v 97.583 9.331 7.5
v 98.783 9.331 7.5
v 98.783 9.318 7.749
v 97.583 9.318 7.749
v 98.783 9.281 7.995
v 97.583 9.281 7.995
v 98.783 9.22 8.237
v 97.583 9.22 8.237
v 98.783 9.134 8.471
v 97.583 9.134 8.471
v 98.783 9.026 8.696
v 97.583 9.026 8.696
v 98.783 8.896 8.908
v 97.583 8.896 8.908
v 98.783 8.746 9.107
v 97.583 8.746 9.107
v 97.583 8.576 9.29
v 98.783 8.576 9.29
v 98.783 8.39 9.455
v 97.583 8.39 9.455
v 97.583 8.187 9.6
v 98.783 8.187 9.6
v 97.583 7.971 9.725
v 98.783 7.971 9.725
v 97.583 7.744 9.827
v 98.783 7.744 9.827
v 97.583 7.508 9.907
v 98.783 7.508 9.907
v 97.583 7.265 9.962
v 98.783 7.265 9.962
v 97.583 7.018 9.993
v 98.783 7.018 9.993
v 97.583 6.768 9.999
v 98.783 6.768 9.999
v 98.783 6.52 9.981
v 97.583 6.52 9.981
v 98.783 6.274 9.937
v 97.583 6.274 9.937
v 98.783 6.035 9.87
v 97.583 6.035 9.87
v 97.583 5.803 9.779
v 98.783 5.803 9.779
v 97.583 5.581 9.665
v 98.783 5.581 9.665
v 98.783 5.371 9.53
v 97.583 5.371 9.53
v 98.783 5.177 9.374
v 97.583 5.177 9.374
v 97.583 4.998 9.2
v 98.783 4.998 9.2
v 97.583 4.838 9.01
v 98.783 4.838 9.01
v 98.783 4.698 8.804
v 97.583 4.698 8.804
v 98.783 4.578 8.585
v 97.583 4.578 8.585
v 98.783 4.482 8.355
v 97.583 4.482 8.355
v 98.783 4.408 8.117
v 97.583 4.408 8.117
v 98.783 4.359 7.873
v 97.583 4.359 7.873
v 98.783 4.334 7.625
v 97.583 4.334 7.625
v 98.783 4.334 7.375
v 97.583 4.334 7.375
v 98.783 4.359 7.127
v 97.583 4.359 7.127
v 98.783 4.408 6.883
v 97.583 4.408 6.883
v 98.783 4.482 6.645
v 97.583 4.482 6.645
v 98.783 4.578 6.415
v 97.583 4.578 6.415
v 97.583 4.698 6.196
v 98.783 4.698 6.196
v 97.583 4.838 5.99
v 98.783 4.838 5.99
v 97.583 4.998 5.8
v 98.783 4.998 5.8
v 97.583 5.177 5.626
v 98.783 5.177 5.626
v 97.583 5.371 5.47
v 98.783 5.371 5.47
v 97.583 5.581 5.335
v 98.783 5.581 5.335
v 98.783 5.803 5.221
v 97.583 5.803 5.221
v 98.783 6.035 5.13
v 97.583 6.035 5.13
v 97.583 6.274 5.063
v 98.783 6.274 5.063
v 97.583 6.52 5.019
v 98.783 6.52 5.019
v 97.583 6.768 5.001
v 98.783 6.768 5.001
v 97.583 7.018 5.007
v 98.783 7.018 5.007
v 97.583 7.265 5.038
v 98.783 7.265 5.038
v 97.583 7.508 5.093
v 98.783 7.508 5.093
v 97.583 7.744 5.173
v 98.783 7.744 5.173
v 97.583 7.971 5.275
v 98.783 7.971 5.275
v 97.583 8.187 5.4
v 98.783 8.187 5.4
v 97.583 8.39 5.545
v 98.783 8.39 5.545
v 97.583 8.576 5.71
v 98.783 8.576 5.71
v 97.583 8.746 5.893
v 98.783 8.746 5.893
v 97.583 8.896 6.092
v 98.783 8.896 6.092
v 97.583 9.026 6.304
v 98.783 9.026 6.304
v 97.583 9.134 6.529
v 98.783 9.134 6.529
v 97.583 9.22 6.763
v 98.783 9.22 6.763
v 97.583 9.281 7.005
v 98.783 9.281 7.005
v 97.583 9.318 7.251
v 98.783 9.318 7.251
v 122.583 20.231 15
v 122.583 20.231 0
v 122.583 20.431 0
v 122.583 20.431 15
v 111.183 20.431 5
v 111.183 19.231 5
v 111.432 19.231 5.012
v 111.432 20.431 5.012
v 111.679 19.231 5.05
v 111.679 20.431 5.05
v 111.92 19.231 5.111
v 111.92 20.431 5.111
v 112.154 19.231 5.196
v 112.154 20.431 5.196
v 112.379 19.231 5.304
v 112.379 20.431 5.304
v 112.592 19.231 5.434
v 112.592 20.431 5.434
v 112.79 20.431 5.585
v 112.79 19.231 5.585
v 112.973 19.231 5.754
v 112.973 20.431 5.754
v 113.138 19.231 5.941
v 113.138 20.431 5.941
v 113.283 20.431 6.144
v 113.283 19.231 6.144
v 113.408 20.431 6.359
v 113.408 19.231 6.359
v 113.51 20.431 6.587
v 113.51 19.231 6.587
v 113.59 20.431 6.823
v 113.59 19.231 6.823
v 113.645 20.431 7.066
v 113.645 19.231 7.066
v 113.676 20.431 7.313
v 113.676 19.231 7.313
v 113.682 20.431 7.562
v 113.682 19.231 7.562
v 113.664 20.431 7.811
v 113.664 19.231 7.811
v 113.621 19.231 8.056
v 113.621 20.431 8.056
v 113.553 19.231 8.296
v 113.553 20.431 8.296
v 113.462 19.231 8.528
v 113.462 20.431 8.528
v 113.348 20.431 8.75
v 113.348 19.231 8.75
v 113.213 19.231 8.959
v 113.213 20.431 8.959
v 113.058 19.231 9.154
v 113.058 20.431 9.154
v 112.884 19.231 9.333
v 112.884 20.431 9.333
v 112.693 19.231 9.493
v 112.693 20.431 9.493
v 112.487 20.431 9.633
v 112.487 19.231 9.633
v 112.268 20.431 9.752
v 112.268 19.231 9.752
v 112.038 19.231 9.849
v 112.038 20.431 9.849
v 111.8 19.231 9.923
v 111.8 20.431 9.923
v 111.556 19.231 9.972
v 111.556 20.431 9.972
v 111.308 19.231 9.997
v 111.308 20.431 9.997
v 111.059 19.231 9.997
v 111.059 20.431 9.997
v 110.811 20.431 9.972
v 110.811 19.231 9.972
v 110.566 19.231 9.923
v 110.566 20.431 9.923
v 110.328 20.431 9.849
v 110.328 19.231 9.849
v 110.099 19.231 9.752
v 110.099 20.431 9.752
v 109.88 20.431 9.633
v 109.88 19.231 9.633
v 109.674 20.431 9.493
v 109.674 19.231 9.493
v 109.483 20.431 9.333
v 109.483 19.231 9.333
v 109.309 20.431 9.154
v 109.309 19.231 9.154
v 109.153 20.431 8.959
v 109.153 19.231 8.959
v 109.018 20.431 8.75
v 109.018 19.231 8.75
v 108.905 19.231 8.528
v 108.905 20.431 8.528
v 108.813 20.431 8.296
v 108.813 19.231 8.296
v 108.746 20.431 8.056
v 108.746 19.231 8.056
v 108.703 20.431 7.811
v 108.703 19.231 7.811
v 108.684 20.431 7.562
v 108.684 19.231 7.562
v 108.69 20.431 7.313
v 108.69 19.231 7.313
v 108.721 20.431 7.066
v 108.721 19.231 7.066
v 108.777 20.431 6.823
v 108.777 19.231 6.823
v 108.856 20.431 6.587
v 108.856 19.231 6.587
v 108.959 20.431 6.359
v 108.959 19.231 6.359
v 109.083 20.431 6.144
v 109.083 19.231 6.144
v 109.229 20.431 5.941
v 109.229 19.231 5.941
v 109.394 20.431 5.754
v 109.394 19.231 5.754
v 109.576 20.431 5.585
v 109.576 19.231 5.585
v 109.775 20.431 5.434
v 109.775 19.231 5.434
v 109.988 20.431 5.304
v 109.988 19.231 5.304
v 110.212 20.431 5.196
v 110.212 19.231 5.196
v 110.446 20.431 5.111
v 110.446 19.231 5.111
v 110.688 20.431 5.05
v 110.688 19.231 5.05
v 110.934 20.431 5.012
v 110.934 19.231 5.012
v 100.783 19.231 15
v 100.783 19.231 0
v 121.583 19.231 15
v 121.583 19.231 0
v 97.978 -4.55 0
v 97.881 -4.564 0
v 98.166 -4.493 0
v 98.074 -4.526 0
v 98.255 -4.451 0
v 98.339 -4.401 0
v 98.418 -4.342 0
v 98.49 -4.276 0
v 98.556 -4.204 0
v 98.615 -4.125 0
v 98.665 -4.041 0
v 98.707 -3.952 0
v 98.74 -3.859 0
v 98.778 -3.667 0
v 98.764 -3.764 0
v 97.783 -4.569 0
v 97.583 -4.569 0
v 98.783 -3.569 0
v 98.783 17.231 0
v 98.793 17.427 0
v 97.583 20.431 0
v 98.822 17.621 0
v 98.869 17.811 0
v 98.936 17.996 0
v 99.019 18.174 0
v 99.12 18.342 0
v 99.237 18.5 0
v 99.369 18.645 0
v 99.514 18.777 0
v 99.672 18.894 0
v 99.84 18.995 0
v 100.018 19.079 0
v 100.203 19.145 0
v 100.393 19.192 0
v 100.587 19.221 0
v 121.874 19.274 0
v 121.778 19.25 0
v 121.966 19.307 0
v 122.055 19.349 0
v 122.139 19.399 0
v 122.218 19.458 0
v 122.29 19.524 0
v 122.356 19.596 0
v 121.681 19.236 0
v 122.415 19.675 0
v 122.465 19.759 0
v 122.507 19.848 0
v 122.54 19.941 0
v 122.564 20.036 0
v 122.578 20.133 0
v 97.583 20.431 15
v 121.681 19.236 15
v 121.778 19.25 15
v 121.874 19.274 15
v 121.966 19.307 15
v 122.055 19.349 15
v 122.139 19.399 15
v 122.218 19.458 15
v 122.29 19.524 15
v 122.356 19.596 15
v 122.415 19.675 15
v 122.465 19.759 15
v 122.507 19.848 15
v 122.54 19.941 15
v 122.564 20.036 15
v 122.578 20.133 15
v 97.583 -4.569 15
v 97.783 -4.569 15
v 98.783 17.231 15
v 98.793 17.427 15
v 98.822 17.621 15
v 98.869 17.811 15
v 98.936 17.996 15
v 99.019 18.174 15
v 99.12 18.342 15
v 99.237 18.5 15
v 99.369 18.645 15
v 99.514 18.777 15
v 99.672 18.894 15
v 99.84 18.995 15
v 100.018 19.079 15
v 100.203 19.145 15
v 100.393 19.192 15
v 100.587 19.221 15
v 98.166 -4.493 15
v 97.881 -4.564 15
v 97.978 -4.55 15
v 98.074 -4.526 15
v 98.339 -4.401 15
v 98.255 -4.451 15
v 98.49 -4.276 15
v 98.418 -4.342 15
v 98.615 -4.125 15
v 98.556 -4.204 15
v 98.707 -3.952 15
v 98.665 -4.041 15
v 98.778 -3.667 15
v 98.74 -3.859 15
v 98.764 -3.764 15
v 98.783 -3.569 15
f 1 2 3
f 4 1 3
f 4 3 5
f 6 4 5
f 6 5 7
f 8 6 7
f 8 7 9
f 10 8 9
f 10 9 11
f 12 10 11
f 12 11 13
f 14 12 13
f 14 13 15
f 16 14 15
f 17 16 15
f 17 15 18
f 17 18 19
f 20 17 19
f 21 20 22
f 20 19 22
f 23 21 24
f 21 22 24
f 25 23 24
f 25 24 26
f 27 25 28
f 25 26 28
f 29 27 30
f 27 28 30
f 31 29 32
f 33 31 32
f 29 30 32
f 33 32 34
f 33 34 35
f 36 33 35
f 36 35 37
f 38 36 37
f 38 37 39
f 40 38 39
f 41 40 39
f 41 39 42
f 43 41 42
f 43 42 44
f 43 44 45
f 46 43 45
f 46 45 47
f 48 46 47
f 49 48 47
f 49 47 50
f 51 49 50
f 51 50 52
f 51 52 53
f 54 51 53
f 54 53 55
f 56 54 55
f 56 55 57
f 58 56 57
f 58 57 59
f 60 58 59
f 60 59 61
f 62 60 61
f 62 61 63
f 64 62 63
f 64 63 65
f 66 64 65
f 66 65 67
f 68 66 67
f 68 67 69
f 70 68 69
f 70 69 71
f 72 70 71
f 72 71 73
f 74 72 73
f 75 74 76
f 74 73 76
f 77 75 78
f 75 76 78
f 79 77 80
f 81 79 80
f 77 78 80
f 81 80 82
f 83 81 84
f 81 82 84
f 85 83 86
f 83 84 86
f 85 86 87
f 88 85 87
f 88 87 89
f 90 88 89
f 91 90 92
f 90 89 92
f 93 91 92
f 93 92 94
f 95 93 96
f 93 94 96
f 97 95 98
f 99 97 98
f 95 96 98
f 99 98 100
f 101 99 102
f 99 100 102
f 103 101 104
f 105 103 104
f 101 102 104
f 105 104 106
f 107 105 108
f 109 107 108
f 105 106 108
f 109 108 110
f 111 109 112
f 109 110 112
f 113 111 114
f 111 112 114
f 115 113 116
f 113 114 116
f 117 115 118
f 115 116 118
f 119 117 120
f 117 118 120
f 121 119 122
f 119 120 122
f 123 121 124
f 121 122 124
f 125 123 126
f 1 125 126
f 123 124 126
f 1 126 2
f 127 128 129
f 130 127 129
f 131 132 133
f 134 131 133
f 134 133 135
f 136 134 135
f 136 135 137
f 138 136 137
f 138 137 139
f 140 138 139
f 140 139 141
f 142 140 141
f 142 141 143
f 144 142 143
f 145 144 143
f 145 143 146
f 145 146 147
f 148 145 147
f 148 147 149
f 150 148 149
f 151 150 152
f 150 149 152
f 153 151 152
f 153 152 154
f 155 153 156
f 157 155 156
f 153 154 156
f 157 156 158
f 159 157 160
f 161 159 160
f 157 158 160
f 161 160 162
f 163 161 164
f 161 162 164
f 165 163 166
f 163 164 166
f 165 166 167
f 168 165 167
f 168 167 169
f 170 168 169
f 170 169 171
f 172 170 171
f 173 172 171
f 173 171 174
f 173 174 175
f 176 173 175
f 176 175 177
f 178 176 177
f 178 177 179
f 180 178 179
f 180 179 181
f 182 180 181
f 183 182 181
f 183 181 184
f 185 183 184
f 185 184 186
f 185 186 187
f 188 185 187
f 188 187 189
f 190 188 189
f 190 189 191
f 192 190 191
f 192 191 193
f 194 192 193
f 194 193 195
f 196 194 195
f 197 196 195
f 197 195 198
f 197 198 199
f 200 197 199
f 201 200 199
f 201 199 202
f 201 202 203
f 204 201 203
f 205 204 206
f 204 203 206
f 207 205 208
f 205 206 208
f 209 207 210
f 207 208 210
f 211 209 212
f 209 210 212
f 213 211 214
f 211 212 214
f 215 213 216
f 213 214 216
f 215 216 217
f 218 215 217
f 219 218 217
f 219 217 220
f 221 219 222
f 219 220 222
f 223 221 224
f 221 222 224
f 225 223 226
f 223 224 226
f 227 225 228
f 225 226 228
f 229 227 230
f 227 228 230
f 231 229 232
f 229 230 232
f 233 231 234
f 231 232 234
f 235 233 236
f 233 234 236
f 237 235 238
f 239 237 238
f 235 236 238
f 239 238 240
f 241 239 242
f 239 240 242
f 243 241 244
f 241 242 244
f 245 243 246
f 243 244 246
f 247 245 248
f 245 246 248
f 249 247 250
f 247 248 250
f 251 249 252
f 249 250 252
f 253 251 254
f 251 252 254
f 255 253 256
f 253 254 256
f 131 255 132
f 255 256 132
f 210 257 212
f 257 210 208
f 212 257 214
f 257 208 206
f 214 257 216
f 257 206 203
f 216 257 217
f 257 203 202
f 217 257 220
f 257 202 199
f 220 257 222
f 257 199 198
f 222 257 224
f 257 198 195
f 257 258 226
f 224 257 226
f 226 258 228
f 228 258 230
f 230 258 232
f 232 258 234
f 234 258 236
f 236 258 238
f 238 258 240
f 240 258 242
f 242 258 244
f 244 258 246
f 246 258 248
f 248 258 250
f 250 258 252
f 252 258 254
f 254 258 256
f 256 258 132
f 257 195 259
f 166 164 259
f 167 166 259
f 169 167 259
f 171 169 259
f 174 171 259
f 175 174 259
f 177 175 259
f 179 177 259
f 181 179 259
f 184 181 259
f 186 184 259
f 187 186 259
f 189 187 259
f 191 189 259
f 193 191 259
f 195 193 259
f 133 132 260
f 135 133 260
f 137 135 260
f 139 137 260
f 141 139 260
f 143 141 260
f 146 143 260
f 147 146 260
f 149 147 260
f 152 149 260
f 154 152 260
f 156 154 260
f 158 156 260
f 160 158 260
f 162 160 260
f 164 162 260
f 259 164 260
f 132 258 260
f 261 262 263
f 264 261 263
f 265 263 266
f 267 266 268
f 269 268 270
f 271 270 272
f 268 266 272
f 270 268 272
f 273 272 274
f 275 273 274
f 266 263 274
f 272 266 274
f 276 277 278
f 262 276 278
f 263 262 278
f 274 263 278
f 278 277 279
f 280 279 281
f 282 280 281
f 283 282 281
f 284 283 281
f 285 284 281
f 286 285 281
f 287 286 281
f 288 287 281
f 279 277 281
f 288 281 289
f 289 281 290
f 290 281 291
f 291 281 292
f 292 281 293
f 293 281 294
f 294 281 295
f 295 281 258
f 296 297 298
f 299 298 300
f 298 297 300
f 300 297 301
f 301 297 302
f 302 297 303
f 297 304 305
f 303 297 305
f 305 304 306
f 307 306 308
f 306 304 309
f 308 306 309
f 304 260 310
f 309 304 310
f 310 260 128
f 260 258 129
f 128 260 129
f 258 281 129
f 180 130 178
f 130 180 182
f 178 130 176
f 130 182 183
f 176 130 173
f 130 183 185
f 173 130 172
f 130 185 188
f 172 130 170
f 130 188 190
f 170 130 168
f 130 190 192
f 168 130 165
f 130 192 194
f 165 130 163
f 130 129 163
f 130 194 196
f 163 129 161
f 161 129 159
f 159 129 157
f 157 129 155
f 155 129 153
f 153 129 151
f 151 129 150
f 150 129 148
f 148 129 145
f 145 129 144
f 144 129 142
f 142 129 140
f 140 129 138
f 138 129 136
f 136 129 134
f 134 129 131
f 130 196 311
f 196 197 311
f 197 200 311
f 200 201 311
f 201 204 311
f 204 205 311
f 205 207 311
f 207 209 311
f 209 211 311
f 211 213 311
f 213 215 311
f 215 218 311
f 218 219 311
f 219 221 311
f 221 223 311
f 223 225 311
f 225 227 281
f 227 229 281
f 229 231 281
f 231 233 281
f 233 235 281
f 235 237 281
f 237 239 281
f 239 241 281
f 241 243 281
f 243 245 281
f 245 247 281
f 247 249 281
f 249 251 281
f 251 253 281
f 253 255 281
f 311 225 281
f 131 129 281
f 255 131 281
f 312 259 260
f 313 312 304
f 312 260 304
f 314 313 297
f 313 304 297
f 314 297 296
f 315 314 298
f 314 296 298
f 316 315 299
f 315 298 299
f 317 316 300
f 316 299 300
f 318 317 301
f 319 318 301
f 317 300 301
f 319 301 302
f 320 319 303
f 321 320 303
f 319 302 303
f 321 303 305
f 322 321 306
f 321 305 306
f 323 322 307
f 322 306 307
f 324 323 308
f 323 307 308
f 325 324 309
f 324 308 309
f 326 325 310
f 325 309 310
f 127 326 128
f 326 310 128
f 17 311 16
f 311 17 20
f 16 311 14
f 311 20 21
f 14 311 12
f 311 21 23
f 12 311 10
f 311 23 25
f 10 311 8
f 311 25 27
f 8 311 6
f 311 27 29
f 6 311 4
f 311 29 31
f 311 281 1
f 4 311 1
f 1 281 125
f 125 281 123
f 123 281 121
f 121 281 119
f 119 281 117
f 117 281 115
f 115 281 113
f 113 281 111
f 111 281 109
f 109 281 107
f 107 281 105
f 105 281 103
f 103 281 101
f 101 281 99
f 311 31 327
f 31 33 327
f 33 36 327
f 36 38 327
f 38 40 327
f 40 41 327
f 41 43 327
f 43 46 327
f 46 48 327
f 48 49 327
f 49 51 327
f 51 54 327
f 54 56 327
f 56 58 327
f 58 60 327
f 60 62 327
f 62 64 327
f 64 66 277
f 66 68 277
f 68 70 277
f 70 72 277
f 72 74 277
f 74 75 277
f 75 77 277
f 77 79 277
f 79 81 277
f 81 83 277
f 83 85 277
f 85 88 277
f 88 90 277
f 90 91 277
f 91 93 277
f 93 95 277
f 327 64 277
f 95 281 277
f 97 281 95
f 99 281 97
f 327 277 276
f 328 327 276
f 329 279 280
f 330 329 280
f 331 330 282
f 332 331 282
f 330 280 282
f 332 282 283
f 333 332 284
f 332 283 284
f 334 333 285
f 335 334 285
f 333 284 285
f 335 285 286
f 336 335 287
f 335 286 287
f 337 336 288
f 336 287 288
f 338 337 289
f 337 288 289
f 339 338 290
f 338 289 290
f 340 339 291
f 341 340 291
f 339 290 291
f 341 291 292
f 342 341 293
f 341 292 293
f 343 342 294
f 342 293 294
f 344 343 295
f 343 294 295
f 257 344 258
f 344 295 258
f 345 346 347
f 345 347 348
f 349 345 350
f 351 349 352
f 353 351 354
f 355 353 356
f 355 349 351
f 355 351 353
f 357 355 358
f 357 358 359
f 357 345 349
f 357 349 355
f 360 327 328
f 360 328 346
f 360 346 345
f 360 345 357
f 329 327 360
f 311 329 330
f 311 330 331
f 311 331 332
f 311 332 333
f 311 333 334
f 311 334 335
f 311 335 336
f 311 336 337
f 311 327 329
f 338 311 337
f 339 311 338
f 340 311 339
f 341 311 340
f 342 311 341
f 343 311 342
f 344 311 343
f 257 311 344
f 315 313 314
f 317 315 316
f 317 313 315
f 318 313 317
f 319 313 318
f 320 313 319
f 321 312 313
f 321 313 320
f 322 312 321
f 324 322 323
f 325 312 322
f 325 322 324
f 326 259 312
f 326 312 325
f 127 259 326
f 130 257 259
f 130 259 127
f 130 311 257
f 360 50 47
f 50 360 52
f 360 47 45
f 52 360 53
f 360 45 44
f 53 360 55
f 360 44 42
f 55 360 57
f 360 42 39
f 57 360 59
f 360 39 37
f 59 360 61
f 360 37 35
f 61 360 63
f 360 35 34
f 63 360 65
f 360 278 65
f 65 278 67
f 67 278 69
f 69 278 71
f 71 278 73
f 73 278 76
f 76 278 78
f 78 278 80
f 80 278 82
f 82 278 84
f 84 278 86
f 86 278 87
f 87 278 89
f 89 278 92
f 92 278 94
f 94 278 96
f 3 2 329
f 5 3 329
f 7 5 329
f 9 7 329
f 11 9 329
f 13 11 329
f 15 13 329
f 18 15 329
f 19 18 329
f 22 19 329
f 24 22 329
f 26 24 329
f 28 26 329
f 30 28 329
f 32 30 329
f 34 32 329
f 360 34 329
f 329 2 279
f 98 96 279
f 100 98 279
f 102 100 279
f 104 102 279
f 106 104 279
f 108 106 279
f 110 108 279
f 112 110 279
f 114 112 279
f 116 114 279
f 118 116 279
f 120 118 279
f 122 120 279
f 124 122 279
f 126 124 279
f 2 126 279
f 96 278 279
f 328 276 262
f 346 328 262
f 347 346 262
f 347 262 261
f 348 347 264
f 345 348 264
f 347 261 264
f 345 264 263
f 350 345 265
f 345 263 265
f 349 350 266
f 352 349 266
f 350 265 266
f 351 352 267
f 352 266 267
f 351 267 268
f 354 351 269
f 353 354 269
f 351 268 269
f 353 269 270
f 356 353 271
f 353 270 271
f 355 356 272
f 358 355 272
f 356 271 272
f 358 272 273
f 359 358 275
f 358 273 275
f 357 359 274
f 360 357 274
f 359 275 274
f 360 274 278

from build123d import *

# Parameters (mm, degrees)
RESSALTO_EXTRUS_O1_DEPTH = 15
ESBO_O2_R                = 2.5
CORTE_EXTRUS_O1_DEPTH    = 126.770027202
ESBO_O3_R                = 2.5
CORTE_EXTRUS_O2_DEPTH    = 35.768628391


with BuildPart() as part:
    # Esboço1 → Ressalto-extrusão1 (new body)
    with BuildSketch(Plane.XY):
        with BuildLine():
            Line((98.783276764, -3.569201676), (98.783276764, 17.230798324))
            ThreePointArc((98.783276764, 17.230798324), (99.369063202, 18.645011887), (100.783276764, 19.230798324))
            Line((100.783276764, 19.230798324), (121.583276764, 19.230798324))
            ThreePointArc((121.583276764, 19.230798324), (122.290383546, 19.523691543), (122.583276764, 20.230798324))
            Line((122.583276764, 20.230798324), (122.583276764, 20.430798324))
            Line((122.583276764, 20.430798324), (97.583276764, 20.430798324))
            Line((97.583276764, 20.430798324), (97.583276764, -4.569201676))
            Line((97.583276764, -4.569201676), (97.783276764, -4.569201676))
            ThreePointArc((97.783276764, -4.569201676), (98.490383546, -4.276308457), (98.783276764, -3.569201676))
        make_face()
    extrude(amount=RESSALTO_EXTRUS_O1_DEPTH)

    # Esboço2 → Corte-extrusão1 (cut, through all)
    with BuildSketch(Plane.XZ.offset(-19.230798324)):
        with Locations(Location((111.183276764, 7.5, 0), (0, 0, 270))):
            Circle(ESBO_O2_R)
    extrude(amount=-CORTE_EXTRUS_O1_DEPTH, mode=Mode.SUBTRACT)

    # Esboço3 → Corte-extrusão2 (cut, through all)
    with BuildSketch(Plane(origin=(98.783276764, 0, 0), x_dir=(0, 0, -1), z_dir=(1, 0, 0))):
        with Locations(Location((-7.5, 6.830798324, 0), (0, 0, 90))):
            Circle(ESBO_O3_R)
    extrude(amount=-CORTE_EXTRUS_O2_DEPTH, mode=Mode.SUBTRACT)


solid = part.part
